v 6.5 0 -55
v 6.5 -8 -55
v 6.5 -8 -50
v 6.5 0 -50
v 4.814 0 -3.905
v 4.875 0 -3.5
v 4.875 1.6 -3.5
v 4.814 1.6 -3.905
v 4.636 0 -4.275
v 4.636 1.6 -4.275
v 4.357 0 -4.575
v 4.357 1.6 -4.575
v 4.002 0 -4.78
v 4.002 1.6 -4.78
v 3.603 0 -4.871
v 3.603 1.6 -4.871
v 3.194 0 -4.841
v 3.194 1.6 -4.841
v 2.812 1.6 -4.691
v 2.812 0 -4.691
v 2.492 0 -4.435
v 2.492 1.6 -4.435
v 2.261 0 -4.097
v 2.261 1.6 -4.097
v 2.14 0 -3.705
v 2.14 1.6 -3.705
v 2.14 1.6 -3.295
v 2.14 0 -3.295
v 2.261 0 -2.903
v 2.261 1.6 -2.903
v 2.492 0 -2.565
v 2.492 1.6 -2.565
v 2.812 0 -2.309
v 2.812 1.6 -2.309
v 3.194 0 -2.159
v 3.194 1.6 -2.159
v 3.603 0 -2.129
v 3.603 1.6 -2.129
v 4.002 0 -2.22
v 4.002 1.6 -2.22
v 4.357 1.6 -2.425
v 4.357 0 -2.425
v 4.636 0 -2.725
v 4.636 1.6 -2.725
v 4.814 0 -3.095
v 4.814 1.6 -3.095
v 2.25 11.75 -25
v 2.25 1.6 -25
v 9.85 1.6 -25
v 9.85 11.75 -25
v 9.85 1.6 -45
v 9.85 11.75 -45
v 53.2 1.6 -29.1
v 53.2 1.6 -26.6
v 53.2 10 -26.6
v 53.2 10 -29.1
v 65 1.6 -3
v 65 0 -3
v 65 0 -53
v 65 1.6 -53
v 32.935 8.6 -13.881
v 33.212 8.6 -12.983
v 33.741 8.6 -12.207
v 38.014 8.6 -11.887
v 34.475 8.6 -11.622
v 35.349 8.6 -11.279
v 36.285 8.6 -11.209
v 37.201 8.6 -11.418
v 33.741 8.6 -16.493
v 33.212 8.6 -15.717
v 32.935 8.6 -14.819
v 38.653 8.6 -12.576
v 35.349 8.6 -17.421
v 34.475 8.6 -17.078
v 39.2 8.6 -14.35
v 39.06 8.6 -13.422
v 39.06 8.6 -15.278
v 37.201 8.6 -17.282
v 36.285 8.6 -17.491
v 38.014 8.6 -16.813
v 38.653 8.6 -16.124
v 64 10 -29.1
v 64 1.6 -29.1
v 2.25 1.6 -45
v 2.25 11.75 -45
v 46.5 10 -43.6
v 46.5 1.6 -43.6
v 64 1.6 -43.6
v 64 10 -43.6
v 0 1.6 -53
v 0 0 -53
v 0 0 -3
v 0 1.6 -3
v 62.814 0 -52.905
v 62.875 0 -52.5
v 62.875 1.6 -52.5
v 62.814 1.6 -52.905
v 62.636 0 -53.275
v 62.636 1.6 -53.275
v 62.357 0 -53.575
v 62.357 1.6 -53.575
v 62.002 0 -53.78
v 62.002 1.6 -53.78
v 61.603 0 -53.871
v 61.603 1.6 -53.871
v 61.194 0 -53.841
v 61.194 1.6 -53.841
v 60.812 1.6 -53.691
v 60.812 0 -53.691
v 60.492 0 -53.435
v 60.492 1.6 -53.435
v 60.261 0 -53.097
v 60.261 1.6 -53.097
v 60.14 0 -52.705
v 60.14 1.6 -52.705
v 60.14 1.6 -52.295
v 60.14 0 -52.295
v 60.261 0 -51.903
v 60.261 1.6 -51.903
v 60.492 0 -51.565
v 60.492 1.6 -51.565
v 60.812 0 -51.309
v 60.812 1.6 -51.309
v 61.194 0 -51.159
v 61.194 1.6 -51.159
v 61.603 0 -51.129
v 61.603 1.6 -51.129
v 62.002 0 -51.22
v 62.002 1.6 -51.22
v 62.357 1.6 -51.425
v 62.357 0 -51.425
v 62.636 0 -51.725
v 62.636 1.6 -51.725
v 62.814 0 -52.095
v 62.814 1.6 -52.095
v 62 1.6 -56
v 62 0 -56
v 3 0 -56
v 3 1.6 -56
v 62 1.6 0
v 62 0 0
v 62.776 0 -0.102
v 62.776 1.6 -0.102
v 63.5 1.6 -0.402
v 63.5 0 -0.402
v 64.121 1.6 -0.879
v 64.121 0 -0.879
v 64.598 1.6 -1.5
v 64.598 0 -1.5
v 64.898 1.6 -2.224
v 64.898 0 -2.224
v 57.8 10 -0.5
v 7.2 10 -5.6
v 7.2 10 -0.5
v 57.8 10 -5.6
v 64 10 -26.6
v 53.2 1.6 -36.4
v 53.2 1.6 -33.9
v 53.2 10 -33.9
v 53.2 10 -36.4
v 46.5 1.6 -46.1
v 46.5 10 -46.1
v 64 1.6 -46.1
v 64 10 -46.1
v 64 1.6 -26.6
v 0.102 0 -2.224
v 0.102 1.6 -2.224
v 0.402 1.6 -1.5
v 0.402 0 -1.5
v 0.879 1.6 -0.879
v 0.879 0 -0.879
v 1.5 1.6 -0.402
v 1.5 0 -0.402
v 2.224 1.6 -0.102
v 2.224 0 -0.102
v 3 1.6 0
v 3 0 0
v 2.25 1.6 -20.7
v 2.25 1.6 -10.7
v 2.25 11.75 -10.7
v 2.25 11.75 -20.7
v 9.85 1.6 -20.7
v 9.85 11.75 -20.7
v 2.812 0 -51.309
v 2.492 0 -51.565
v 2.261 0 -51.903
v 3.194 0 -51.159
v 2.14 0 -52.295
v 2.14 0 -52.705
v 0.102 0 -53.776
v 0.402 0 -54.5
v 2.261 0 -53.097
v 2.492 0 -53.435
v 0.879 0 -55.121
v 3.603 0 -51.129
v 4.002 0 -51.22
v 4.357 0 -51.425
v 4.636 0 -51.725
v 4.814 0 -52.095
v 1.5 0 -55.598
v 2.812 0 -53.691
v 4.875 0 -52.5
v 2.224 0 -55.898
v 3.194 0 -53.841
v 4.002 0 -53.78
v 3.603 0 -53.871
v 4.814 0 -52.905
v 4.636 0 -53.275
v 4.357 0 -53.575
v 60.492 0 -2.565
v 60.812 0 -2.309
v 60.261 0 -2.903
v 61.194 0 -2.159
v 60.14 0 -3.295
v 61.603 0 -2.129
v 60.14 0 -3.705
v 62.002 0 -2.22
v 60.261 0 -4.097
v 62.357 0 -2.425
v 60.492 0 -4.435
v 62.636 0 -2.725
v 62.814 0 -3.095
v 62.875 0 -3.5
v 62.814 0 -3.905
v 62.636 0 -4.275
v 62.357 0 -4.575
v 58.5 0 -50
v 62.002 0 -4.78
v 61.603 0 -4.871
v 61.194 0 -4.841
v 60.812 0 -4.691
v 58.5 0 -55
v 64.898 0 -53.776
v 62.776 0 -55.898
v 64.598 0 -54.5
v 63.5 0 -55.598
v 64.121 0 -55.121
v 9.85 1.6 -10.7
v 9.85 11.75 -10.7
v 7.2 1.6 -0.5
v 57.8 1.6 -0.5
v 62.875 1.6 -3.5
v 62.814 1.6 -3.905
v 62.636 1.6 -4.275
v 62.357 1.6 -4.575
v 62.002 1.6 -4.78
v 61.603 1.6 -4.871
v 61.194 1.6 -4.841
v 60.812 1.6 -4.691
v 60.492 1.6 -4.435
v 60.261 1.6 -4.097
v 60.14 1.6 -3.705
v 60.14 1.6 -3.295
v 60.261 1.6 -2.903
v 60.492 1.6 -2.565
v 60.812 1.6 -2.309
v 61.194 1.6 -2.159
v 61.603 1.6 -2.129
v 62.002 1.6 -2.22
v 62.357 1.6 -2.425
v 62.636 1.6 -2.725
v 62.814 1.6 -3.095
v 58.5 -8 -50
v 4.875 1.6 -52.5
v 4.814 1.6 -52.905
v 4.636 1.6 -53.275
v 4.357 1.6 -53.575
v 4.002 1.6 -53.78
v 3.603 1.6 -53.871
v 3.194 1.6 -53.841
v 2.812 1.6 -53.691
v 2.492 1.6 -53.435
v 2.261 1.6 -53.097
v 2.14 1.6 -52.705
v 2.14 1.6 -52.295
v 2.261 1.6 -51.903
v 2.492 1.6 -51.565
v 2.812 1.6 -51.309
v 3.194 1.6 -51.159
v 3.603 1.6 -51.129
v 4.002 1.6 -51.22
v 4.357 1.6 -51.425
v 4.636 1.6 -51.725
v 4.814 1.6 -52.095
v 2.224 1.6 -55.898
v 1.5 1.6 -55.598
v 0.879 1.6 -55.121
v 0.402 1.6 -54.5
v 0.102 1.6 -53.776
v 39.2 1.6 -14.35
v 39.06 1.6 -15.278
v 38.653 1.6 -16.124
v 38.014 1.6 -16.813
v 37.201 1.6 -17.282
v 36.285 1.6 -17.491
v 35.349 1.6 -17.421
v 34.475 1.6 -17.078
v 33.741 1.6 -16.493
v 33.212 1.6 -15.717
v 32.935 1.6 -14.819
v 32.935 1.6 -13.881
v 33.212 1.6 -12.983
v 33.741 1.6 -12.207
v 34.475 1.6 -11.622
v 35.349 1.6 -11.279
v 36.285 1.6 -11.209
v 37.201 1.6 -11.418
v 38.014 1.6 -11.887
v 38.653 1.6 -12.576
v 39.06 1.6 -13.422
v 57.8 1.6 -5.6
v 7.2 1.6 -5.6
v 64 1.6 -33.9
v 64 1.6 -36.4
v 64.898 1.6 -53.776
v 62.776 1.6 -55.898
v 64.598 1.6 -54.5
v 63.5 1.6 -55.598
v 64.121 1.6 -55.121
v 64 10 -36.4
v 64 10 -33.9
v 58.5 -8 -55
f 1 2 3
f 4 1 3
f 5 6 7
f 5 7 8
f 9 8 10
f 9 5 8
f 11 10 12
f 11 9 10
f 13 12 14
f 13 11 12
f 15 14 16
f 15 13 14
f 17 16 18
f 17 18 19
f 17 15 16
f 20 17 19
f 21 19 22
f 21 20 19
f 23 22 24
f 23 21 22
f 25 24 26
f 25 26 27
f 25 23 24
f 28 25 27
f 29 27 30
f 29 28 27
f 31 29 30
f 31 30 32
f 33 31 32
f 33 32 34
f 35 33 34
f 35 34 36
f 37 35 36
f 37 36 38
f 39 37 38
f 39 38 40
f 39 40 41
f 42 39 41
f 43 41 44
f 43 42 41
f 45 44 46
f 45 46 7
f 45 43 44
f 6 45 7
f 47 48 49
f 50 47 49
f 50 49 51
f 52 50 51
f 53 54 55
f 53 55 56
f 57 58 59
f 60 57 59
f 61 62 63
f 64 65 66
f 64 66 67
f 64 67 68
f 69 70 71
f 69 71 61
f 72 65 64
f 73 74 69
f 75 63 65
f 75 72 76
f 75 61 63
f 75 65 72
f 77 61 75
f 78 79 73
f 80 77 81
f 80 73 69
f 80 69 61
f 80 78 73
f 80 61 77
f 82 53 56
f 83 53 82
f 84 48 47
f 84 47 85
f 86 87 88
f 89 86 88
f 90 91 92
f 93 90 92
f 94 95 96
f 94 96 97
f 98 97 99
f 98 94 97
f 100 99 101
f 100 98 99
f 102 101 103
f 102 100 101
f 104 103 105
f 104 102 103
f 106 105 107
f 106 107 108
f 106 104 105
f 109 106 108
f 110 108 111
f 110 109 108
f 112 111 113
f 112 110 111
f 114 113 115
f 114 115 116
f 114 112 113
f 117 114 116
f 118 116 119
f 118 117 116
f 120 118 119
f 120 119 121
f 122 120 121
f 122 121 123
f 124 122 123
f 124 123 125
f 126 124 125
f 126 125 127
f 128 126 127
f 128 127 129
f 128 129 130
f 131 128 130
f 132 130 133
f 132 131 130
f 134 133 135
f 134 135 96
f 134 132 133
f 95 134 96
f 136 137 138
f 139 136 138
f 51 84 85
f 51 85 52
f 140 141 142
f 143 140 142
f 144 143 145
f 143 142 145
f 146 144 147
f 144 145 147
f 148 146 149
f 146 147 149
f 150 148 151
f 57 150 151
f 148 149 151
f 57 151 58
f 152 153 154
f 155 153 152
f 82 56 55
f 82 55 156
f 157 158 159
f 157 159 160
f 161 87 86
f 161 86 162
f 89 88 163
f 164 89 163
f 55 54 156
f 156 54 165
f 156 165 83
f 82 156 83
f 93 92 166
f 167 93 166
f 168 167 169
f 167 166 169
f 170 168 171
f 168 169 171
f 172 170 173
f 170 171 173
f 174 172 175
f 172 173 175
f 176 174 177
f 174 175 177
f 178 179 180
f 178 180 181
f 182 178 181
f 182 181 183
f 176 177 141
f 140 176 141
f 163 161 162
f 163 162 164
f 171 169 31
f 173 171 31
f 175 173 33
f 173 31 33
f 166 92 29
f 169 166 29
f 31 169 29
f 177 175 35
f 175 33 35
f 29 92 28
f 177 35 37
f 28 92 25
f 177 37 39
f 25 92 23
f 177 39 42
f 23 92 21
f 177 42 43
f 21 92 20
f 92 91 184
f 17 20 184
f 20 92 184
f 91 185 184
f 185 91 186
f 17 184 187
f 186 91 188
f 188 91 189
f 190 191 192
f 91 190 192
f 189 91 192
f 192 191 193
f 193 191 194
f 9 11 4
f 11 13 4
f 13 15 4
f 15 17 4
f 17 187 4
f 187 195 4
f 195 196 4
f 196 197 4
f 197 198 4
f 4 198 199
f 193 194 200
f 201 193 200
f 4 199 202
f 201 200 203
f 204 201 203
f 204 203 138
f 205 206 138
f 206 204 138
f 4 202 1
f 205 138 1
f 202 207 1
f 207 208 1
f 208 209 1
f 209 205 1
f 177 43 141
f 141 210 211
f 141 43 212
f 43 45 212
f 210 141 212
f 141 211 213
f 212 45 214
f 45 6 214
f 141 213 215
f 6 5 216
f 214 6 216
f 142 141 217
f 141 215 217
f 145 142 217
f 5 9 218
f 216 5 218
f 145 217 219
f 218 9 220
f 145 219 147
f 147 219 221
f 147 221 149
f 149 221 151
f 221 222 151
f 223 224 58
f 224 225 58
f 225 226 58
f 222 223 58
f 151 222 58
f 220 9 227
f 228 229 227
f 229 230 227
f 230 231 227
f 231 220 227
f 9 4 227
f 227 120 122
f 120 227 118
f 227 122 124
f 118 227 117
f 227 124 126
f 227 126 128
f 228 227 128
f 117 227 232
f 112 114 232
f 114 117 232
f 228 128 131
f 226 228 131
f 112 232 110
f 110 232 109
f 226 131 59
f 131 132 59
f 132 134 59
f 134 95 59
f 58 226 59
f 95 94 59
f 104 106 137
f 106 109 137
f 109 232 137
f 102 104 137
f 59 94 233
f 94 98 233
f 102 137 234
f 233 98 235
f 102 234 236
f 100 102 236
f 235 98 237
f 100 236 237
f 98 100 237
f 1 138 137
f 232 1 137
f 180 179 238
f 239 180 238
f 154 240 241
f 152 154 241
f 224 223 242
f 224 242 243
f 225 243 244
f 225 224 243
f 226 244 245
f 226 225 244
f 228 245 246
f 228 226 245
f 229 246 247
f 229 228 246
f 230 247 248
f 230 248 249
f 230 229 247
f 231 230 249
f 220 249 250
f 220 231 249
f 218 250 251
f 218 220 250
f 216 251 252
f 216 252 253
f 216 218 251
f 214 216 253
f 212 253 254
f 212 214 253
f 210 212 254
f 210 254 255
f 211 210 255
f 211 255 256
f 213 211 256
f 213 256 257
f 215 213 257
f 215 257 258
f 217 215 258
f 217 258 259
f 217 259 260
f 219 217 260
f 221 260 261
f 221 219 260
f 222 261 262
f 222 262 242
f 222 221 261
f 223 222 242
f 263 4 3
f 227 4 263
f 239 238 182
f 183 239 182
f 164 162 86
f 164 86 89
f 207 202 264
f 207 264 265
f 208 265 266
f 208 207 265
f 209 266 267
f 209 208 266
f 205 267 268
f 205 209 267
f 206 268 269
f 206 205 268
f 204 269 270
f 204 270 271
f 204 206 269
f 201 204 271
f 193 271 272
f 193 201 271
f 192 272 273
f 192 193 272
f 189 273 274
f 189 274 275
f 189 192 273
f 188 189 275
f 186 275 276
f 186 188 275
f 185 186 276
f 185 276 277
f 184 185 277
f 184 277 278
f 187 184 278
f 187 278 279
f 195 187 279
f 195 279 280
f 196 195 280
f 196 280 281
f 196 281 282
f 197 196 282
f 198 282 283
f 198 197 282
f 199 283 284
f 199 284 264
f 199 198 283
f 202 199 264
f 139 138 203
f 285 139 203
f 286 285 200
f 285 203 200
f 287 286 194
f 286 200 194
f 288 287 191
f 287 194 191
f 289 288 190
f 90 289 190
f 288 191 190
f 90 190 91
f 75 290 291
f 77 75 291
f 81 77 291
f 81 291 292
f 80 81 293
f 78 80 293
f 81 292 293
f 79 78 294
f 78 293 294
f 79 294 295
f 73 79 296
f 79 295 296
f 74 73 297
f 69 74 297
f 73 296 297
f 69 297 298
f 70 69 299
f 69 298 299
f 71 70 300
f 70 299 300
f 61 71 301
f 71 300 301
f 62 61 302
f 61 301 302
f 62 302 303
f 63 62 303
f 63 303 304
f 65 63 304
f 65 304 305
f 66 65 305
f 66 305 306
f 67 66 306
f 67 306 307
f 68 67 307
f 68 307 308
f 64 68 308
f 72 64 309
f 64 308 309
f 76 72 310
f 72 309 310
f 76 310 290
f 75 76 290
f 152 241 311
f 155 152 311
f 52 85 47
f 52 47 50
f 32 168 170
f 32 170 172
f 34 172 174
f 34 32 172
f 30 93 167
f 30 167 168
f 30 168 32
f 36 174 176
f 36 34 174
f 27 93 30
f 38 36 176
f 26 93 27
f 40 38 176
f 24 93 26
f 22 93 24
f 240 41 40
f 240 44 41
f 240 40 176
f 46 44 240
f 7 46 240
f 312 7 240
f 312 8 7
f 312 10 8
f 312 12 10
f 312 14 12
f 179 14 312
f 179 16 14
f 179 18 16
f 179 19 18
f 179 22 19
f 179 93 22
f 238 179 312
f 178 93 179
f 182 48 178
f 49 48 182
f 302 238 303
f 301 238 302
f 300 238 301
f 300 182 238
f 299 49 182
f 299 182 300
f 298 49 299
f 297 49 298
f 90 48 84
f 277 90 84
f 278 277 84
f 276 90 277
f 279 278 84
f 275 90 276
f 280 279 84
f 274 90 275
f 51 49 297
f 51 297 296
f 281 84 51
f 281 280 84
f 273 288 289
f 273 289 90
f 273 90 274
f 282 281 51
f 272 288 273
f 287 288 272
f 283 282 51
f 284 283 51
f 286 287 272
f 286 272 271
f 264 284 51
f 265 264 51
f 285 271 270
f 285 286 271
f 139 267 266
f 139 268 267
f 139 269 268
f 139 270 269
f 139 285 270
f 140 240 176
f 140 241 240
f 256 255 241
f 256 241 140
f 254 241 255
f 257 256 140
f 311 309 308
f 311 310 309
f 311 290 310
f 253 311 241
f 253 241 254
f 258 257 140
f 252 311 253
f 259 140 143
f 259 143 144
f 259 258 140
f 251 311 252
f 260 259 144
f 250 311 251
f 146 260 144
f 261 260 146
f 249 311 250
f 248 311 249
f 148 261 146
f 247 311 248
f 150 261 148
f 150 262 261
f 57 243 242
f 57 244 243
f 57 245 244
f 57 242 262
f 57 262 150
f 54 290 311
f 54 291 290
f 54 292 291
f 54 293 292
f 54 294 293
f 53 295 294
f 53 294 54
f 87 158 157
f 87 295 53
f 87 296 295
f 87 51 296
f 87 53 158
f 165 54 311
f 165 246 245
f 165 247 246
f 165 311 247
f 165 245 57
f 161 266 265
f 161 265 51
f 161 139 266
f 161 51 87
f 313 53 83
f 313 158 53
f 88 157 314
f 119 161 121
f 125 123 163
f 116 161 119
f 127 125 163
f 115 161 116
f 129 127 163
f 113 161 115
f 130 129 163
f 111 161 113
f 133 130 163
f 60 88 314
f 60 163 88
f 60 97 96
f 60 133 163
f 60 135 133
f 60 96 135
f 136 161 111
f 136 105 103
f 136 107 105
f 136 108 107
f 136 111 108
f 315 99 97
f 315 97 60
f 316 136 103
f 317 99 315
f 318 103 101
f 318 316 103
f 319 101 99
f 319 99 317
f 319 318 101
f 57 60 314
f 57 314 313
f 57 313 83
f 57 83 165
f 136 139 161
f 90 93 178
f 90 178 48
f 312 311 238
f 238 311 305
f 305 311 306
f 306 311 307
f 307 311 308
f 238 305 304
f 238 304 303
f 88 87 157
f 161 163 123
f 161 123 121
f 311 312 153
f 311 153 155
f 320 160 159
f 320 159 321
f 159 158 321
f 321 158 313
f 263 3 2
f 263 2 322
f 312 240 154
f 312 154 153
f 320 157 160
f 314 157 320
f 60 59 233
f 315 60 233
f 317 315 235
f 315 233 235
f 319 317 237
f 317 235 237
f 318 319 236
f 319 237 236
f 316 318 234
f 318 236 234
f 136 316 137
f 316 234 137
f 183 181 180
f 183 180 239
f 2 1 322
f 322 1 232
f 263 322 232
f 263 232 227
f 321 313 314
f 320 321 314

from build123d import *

# Parameters (mm, degrees)
SKETCH1_R           = 1.375
BOSS_EXTRUDE1_DEPTH = 1.6
SKETCH2_W           = 7.6
SKETCH2_H           = 20
SKETCH2_H_2         = 10
BOSS_EXTRUDE2_DEPTH = 10.15
SKETCH3_W           = 50.6
SKETCH3_H           = 5.1
BOSS_EXTRUDE3_DEPTH = 8.4
SKETCH4_R           = 3.15
BOSS_EXTRUDE4_DEPTH = 7
SKETCH5_W           = 17.5
SKETCH5_H           = 2.5
SKETCH5_W_2         = 10.8
BOSS_EXTRUDE5_DEPTH = 8.4
SKETCH6_W           = 52
SKETCH6_H           = 5
BOSS_EXTRUDE6_DEPTH = 8


with BuildPart() as part:
    # Sketch1 → Boss-Extrude1 (new body)
    with BuildSketch(Plane(origin=(0, 0, 0), x_dir=(1, 0, 0), z_dir=(0, 1, 0))):
        with BuildLine():
            Line((3, 0), (62, 0))
            ThreePointArc((62, 0), (64.121320344, 0.878679656), (65, 3))
            Line((65, 3), (65, 53))
            ThreePointArc((65, 53), (64.121320344, 55.121320344), (62, 56))
            Line((62, 56), (3, 56))
            ThreePointArc((3, 56), (0.878679656, 55.121320344), (0, 53))
            Line((0, 53), (0, 3))
            ThreePointArc((0, 3), (0.878679656, 0.878679656), (3, 0))
        make_face()
        with Locations((3.5, 52.5)):
            Circle(SKETCH1_R, mode=Mode.SUBTRACT)
        with Locations((61.5, 52.5)):
            Circle(SKETCH1_R, mode=Mode.SUBTRACT)
        with Locations((3.5, 3.5)):
            Circle(SKETCH1_R, mode=Mode.SUBTRACT)
        with Locations((61.5, 3.5)):
            Circle(SKETCH1_R, mode=Mode.SUBTRACT)
    extrude(amount=BOSS_EXTRUDE1_DEPTH)

    # Sketch2 → Boss-Extrude2 (add)
    with BuildSketch(Plane(origin=(0, 1.6, 0), x_dir=(1, 0, 0), z_dir=(0, 1, 0))):
        with Locations((6.05, 35)):
            Rectangle(SKETCH2_W, SKETCH2_H)
        with Locations((6.05, 15.7)):
            Rectangle(SKETCH2_W, SKETCH2_H_2)
    extrude(amount=BOSS_EXTRUDE2_DEPTH)

    # Sketch3 → Boss-Extrude3 (add)
    with BuildSketch(Plane(origin=(0, 1.6, 0), x_dir=(1, 0, 0), z_dir=(0, 1, 0))):
        with Locations((32.5, 3.05)):
            Rectangle(SKETCH3_W, SKETCH3_H)
    extrude(amount=BOSS_EXTRUDE3_DEPTH)

    # Sketch4 → Boss-Extrude4 (add)
    with BuildSketch(Plane(origin=(0, 1.6, 0), x_dir=(1, 0, 0), z_dir=(0, 1, 0))):
        with Locations((36.05, 14.35)):
            Circle(SKETCH4_R)
    extrude(amount=BOSS_EXTRUDE4_DEPTH)

    # Sketch5 → Boss-Extrude5 (add)
    with BuildSketch(Plane(origin=(0, 1.6, 0), x_dir=(1, 0, 0), z_dir=(0, 1, 0))):
        with Locations((55.25, 44.85)):
            Rectangle(SKETCH5_W, SKETCH5_H)
        with Locations((58.6, 35.15)):
            Rectangle(SKETCH5_W_2, SKETCH5_H)
        with Locations((58.6, 27.85)):
            Rectangle(SKETCH5_W_2, SKETCH5_H)
    extrude(amount=BOSS_EXTRUDE5_DEPTH)

    # Sketch6 → Boss-Extrude6 (add)
    with BuildSketch(Plane.XZ):
        with Locations((32.5, -52.5)):
            Rectangle(SKETCH6_W, SKETCH6_H)
    extrude(amount=BOSS_EXTRUDE6_DEPTH)


solid = part.part
